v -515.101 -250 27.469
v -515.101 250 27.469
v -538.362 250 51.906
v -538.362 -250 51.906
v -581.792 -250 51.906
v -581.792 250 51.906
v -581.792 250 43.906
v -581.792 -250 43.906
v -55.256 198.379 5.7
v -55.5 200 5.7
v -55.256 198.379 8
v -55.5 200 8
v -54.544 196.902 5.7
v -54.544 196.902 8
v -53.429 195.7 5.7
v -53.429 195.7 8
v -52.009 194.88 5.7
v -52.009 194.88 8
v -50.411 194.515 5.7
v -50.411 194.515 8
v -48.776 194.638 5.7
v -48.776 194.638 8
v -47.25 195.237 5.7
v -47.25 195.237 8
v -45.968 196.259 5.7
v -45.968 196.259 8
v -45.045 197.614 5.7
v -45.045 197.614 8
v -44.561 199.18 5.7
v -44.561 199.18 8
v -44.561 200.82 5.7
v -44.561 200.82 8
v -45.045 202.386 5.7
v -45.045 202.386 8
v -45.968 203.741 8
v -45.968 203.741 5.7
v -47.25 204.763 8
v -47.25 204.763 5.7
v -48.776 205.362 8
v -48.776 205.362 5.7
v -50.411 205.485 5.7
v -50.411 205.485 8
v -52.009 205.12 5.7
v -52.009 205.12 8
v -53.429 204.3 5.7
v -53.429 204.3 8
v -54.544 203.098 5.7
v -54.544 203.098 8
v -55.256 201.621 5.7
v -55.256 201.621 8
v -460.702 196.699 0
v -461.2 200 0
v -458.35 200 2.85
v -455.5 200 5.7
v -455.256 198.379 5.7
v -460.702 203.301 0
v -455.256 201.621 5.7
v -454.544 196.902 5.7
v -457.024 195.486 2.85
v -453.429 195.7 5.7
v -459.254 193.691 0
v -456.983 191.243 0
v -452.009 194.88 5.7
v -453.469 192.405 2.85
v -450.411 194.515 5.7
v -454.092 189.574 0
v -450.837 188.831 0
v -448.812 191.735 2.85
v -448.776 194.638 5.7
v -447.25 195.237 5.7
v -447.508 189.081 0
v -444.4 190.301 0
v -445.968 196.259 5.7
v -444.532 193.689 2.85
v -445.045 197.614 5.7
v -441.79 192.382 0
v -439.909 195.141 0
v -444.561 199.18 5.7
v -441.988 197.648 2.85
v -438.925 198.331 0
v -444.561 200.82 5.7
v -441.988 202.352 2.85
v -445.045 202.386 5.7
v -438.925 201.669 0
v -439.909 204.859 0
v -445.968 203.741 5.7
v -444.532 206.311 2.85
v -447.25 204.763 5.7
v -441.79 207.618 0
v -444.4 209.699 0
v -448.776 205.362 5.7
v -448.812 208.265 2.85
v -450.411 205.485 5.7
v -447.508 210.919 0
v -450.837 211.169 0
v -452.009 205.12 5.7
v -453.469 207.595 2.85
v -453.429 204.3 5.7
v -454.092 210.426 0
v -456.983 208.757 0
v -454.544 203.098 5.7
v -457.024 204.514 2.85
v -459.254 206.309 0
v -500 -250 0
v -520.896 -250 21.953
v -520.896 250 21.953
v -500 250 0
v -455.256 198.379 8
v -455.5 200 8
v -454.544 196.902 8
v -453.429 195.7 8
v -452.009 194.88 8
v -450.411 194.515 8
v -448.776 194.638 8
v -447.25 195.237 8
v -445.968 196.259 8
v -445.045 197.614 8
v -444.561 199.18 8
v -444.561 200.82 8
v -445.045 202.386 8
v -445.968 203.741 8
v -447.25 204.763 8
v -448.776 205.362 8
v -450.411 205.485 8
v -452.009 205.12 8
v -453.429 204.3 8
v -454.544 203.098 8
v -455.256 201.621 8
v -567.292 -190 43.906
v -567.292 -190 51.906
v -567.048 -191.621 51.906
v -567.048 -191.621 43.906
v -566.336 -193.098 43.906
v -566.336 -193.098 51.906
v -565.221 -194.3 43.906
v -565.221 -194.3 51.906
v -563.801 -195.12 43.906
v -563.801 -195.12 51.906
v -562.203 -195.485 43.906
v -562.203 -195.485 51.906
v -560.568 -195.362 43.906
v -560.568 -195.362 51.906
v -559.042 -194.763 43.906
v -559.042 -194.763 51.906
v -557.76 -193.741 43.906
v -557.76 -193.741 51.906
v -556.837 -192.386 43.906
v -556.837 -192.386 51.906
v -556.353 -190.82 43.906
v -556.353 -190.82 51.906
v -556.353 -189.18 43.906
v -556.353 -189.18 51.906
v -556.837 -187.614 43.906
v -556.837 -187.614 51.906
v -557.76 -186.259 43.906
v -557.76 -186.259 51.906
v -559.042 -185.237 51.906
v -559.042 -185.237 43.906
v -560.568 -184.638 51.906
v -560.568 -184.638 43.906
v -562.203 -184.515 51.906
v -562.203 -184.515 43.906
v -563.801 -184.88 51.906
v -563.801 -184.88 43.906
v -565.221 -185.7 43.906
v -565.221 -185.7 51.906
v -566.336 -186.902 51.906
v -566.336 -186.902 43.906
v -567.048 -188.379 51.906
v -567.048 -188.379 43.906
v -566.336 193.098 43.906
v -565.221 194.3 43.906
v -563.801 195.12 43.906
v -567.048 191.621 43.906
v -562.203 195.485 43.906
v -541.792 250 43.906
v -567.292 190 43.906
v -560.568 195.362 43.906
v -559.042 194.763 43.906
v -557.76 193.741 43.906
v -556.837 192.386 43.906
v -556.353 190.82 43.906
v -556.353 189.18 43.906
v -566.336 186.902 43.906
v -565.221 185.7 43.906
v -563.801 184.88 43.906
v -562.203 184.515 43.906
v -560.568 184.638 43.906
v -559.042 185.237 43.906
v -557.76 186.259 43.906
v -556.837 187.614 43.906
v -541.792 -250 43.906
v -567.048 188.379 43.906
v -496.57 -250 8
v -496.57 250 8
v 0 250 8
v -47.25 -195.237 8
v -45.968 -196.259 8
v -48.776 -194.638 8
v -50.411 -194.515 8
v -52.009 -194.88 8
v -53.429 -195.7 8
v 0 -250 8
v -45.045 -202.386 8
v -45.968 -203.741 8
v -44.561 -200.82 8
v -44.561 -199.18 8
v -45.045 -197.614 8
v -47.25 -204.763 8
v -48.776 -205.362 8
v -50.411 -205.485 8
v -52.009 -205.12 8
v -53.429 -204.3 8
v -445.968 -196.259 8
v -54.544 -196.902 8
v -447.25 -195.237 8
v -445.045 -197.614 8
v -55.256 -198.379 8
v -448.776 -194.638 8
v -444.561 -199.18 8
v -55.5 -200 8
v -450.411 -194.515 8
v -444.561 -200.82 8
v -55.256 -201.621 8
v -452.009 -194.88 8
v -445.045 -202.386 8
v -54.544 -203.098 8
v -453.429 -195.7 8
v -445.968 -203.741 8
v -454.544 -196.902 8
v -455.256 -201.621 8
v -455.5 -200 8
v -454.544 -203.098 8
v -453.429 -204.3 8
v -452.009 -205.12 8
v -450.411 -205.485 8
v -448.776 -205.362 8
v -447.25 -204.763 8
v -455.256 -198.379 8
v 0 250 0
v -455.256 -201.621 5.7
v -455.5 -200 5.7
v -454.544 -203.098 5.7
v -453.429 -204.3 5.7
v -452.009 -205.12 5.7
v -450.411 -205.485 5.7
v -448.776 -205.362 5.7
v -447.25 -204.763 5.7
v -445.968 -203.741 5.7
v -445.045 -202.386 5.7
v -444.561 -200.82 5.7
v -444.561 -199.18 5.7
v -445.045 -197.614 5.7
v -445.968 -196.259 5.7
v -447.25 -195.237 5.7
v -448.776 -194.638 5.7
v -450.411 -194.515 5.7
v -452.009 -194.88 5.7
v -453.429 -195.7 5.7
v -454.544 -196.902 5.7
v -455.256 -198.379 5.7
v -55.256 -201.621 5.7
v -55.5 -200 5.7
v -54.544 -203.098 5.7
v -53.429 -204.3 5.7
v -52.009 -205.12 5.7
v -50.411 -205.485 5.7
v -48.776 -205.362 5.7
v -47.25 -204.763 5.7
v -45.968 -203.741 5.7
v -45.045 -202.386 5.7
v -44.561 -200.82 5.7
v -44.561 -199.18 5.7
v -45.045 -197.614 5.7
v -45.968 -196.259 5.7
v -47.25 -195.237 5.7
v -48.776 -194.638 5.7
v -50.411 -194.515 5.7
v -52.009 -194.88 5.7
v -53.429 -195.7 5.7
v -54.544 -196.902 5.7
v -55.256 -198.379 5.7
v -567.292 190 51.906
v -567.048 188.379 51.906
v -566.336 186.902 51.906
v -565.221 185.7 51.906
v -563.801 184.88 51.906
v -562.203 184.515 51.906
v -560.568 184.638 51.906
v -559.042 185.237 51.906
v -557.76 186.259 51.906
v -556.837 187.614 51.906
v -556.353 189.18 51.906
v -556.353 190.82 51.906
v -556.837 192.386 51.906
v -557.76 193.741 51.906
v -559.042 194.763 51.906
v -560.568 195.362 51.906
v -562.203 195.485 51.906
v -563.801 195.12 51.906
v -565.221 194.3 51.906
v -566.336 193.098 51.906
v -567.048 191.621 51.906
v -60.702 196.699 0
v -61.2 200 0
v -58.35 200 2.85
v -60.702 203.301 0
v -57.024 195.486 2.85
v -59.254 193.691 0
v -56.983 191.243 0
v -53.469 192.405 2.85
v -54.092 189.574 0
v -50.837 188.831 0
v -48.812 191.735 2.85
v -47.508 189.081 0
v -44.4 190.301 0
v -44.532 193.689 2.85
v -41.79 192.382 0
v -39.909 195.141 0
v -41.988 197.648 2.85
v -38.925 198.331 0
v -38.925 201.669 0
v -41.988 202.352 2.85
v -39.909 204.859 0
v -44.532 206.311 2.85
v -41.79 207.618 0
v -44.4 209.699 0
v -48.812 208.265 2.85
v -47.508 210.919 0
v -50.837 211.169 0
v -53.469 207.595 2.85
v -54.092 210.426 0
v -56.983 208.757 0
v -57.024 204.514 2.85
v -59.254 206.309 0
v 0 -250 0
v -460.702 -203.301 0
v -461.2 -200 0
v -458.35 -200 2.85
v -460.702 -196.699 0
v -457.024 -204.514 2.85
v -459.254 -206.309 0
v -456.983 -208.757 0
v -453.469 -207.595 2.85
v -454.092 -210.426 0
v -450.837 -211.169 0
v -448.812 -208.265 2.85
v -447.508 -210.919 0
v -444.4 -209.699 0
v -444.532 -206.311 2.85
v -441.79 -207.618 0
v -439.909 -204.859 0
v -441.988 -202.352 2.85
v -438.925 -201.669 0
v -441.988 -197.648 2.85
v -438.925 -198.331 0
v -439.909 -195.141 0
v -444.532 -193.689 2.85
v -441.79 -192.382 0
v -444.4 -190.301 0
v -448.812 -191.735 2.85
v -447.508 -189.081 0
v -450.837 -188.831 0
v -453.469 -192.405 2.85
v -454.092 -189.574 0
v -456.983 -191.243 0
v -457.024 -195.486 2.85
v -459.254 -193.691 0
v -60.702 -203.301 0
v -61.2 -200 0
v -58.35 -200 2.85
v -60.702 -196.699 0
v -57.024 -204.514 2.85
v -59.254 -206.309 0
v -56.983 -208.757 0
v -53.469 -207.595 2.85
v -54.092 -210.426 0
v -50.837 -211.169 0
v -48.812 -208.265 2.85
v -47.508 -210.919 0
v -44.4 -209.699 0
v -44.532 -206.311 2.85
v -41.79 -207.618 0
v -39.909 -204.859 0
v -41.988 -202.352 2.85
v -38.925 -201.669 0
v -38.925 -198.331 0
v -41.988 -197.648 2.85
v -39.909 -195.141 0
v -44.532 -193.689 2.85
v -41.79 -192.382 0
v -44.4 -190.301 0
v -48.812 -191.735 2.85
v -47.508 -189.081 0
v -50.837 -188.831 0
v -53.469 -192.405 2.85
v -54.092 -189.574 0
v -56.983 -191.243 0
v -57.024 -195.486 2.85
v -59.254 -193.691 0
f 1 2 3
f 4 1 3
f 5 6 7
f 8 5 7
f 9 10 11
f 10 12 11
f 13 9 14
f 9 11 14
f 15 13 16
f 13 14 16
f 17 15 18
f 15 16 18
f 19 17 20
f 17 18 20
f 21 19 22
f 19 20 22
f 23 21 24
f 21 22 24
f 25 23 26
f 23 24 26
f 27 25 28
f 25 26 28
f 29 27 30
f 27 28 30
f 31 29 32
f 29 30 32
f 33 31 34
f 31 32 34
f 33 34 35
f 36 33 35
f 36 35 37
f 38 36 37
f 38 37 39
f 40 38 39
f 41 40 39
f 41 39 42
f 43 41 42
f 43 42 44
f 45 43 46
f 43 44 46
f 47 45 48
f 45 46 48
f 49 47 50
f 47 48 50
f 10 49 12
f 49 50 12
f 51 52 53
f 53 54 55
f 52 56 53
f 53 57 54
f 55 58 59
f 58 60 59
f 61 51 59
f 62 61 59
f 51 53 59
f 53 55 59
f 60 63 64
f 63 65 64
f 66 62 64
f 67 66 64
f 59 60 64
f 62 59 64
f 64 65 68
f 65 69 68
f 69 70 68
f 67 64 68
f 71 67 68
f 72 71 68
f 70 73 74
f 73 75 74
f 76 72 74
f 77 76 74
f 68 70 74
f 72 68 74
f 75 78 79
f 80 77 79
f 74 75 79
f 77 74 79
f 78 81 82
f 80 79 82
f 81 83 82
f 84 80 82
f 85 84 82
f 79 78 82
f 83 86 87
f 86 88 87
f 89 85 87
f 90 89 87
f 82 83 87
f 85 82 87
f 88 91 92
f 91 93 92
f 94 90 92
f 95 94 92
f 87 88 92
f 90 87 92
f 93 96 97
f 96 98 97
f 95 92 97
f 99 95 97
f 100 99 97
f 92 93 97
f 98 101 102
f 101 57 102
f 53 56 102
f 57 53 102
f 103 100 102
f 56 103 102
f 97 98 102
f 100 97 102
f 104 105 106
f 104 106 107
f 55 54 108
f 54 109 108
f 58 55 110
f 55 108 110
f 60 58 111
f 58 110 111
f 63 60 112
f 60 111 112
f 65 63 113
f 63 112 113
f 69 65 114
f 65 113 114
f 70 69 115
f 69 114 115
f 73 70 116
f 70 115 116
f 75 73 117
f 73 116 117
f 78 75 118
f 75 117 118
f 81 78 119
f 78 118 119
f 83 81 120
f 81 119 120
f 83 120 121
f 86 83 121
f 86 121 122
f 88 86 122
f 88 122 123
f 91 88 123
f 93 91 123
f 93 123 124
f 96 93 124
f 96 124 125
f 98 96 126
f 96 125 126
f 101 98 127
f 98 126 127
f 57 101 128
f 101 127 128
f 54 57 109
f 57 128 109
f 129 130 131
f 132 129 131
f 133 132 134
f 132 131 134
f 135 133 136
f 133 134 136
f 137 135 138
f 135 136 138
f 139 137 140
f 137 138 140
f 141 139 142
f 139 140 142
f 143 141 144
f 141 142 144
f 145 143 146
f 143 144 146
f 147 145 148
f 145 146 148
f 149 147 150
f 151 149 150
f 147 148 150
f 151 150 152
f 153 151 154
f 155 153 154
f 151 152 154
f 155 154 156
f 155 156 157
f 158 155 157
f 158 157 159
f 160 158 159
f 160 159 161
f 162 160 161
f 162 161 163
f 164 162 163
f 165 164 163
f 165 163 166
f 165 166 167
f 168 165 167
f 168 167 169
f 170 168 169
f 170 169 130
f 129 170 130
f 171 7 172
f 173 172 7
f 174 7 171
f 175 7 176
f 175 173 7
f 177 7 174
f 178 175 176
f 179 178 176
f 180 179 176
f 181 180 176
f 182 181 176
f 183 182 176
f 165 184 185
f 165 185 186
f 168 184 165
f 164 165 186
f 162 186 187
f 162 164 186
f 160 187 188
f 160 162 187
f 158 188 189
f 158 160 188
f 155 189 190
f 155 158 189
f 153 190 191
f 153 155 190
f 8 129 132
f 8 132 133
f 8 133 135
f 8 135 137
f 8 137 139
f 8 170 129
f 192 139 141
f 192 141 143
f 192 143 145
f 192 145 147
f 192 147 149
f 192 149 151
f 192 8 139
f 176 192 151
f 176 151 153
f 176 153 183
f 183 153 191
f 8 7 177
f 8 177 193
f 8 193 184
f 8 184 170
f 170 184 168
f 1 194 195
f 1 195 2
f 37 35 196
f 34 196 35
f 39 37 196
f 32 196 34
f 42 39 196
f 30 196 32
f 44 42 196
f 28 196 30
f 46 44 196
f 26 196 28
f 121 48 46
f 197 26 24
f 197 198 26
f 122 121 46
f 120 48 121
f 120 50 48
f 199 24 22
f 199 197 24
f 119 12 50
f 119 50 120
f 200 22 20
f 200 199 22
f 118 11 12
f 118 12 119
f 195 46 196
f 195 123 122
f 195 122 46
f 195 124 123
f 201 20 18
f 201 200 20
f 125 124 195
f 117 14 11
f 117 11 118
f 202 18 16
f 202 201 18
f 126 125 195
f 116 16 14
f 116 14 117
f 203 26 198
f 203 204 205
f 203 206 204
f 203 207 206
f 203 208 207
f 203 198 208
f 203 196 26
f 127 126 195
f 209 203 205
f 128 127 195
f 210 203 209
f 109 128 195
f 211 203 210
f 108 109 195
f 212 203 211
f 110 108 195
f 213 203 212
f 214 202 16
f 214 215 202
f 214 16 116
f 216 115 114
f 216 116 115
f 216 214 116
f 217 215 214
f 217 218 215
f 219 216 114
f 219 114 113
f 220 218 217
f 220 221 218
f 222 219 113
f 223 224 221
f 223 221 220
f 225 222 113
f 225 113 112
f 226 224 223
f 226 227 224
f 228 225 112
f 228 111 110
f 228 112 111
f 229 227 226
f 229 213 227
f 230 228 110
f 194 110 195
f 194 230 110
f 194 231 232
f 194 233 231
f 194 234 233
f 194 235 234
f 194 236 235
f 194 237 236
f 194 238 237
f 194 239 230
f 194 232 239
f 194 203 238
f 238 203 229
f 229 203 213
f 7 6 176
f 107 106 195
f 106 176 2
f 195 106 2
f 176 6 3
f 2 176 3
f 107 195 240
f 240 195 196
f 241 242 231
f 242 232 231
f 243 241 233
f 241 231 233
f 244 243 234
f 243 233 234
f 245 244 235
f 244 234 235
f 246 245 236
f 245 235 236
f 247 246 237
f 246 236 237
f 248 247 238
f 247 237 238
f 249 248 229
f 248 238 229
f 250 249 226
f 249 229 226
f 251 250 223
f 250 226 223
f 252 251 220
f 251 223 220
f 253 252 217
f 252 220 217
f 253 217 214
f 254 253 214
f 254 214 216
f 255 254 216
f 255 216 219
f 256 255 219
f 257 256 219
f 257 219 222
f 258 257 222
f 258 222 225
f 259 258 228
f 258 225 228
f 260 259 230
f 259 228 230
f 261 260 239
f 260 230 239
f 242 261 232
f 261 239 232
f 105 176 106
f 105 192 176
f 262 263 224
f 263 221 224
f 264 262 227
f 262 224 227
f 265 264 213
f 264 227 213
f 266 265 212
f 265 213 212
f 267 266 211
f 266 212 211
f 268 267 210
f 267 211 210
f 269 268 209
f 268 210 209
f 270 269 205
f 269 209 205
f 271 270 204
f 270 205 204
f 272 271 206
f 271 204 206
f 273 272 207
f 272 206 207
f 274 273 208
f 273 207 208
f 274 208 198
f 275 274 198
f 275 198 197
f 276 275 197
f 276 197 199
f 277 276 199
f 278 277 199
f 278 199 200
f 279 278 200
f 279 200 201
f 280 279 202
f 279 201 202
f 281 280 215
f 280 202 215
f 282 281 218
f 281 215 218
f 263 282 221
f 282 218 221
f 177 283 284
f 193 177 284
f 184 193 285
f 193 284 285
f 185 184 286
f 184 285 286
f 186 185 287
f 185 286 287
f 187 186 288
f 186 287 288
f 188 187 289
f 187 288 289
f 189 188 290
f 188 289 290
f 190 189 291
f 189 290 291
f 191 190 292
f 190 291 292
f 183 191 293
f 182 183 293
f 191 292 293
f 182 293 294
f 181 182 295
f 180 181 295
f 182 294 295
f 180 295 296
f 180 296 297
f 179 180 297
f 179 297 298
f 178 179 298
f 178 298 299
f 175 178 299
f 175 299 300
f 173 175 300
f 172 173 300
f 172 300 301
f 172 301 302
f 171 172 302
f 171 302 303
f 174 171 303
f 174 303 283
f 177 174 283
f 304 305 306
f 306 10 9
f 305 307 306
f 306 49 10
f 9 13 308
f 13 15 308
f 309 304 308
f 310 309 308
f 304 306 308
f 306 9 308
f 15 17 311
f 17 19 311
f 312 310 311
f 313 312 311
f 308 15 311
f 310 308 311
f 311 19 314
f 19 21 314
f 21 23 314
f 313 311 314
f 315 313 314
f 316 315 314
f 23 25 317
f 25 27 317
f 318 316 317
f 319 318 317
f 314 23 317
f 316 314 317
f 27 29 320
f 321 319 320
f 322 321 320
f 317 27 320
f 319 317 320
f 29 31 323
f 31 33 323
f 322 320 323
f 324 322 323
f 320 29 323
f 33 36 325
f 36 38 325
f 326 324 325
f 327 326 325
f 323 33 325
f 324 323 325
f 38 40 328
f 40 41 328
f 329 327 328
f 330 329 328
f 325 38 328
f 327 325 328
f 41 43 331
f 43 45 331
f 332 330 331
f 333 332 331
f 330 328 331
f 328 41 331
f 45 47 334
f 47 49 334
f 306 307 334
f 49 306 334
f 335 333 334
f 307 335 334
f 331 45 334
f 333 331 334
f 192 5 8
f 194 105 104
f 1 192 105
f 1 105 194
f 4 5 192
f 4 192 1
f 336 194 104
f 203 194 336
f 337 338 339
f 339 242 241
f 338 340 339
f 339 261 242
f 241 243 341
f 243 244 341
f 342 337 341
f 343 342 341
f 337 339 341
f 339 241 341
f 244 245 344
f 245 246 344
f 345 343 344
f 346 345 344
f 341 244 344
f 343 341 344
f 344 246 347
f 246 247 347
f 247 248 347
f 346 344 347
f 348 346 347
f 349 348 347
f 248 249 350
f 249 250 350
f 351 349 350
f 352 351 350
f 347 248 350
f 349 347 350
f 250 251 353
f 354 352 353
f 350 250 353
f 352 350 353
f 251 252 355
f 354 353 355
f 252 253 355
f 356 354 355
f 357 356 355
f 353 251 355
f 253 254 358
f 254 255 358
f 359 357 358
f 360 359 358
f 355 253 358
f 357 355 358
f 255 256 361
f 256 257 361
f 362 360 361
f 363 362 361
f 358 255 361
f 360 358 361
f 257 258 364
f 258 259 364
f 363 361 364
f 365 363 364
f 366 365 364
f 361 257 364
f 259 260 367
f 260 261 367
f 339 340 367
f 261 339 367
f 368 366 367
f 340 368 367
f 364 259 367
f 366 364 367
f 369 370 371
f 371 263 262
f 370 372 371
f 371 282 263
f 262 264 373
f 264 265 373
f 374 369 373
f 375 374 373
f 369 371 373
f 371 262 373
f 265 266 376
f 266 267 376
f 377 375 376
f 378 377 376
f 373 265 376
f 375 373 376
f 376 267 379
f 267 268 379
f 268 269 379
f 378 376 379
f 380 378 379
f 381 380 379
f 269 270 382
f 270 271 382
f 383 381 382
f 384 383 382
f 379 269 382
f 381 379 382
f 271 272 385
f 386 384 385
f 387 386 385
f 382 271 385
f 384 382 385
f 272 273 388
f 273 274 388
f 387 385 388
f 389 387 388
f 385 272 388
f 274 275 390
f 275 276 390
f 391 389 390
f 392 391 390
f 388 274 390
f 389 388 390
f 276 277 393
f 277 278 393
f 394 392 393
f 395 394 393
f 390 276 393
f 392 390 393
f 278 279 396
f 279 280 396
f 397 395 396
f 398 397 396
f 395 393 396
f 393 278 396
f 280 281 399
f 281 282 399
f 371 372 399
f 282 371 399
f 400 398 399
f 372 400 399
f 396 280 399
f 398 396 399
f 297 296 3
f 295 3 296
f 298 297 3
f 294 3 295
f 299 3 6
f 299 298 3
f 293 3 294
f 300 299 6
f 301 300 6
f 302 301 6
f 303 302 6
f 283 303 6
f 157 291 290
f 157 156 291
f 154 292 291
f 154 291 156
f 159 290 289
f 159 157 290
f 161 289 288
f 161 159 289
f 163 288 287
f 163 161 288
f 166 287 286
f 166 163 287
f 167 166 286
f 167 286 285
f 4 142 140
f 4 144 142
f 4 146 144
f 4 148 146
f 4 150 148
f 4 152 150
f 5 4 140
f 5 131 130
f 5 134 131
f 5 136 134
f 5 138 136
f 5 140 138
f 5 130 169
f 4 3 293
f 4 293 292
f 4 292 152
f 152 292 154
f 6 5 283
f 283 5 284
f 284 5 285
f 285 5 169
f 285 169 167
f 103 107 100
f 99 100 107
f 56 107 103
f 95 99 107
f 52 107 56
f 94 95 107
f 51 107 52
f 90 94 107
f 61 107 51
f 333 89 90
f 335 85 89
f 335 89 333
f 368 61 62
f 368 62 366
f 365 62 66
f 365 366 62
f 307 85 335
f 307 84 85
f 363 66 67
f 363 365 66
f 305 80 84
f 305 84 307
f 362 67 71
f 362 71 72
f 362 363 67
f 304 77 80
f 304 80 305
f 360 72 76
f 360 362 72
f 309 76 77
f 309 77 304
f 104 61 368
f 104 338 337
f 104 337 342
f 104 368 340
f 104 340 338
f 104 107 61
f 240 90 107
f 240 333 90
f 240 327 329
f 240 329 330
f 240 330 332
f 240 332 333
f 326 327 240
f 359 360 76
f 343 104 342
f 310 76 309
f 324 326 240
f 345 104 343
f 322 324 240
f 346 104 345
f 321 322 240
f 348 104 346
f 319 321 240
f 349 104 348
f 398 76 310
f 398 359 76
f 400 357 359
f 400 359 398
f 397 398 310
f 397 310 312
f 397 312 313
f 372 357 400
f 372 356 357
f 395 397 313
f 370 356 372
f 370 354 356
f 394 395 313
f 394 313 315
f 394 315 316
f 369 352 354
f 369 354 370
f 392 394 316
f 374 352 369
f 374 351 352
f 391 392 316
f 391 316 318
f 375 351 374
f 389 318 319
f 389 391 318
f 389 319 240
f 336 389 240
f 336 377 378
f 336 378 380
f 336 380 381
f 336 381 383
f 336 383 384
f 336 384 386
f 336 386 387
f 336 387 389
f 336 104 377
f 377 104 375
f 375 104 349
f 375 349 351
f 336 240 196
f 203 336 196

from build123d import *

# Parameters (mm, degrees)
F1_DEPTH       = 250
F3_D           = 11
F3_CSINK_D     = 22.4
F3_CSINK_ANGLE = 90
F5_D           = 11


with BuildPart() as f1:
    # F0 (on Front) → F1 (new body, symmetric)
    with BuildSketch(Plane.XZ):
        Polygon((-541.7919028829, 43.9059940034), (-520.8959514415, 21.9529970017), (-515.1013105541, 27.4686236195), (-538.3620118087, 51.9059940034), (-581.7919028829, 51.9059940034), (-581.7919028829, 43.9059940034), align=None)
        Polygon((-500, 0), (0, 0), (0, 8), (-496.5701089258, 8), (-515.1013105541, 27.4686236195), (-520.8959514415, 21.9529970017), align=None)
    extrude(amount=F1_DEPTH, both=True)

    # F3 (through all)
    with Locations(Plane(origin=(0, 0, 0), x_dir=(1, 0, 0), z_dir=(0, 0, -1))):
        with Locations((-450, 200), (-50, 200), (-50, -200), (-450, -200)):
            CounterSinkHole(F3_D / 2, F3_CSINK_D / 2, counter_sink_angle=F3_CSINK_ANGLE)

    # F5 (through all)
    with Locations(Plane(origin=(0, 0, 43.9059940034), x_dir=(1, 0, 0), z_dir=(0, 0, -1))):
        with Locations((-561.7919028829, 190), (-561.7919028829, -190)):
            Hole(F5_D / 2)


solid = f1.part
